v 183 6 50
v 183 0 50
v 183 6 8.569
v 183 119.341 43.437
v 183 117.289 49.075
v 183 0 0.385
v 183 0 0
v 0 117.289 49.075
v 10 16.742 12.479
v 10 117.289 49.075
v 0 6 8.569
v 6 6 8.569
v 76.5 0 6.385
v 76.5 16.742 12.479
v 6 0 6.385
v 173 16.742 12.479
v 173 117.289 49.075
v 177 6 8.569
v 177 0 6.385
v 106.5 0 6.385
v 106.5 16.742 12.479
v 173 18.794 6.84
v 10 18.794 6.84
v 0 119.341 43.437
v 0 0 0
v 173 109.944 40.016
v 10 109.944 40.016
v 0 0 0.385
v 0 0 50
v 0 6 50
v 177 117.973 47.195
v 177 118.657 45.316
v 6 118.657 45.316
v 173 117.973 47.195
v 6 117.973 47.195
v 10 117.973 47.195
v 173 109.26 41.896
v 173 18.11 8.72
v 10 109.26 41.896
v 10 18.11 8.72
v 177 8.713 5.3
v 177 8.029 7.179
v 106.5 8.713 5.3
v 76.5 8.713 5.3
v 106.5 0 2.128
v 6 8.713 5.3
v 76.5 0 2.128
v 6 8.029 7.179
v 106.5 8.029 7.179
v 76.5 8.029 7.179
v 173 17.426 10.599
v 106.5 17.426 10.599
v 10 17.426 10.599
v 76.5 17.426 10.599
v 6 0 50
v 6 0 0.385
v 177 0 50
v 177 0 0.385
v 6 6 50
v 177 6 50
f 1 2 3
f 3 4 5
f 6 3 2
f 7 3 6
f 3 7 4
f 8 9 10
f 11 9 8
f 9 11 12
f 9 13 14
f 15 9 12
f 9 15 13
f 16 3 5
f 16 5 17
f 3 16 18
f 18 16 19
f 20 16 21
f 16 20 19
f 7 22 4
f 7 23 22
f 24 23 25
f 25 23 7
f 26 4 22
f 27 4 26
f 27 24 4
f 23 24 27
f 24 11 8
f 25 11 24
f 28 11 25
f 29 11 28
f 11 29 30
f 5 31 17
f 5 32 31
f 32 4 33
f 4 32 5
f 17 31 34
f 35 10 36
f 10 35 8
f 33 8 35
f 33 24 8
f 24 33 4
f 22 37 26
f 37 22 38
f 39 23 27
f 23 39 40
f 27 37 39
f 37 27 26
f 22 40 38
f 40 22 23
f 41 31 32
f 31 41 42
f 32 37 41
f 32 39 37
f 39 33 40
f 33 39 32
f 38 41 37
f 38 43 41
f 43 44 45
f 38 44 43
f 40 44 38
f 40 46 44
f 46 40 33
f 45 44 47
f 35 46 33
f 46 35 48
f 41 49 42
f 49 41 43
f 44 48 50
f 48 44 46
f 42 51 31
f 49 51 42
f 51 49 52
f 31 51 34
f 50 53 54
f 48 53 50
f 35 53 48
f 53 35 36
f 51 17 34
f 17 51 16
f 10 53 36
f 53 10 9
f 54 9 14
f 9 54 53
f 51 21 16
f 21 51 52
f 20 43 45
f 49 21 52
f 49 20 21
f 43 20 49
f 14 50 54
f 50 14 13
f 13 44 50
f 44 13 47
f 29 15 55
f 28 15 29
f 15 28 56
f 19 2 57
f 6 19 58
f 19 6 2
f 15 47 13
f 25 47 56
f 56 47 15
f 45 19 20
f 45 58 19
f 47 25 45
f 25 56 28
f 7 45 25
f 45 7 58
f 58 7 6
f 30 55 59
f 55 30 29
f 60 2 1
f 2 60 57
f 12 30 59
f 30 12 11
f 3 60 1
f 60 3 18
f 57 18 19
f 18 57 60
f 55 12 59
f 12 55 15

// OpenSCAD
// TODO:
// 1. More space for cable, requires ~4mm below bottom of screen
// 2. Hold the screen in place better
// 3. Mount for raspi
//
// Maybe:
// - Bigger notch, so I don't have to clear out the debris?
// - It's a little transparent when the sun is behind it
// - Is angle best?
// - Maybe the slot should be on the sides instead of the bottom

module example_intersection()
{
  // Options for case
  thickness = 6;
  angle = 20;
  bottom_bezel = 20;
  main_bezel = 10;
  base_depth = 50;
  cable_notch_width = 30;

  // Physical params of display
  screen_width = 163;
  screen_height = 97;
  inset = 4;
  bottom_inset = 10;
  inset_thickness = 2;

  // Computed params
  frame_outside_width = screen_width + 2 * main_bezel;
  frame_outside_height = screen_height + bottom_bezel + main_bezel;

  leftover_inset = main_bezel - inset;
  leftover_bottom_inset = bottom_bezel - bottom_inset;

  // Increasing X: Left to right, looking straight on
  // Increasing Y: Down to up, looking straight on
  // Increazing Z: Front to back, looking straight on

  rotate([0,0,0]) {
    // Main frame
    difference() {
      rotate([angle, 0, 0]) {
        difference() {
          union() {
            difference() {
              // Main housing
              cube([frame_outside_width, frame_outside_height, thickness], center=false);

              // Punch a hole all the way through for visible part of the screen
              translate([main_bezel, bottom_bezel,0]) {
                cube([screen_width, screen_height, thickness], center= false);
              };

              // Slightly larger inset a bit around edges
              // Leaves inset_thickness remaining
              translate([leftover_inset, leftover_bottom_inset, inset_thickness]) {
                cube([screen_width + 2 * inset, frame_outside_height - leftover_bottom_inset, thickness-inset_thickness], center = false);
              };
            };

            translate([0, 0, thickness - inset_thickness]) {
              difference() {
                cube([frame_outside_width, frame_outside_height, inset_thickness], center=false);
                translate([main_bezel,bottom_bezel,0]) {
                  cube([screen_width, screen_height + main_bezel, inset_thickness], center=false);
                };
              };
            };

            // Add a back for the little slot
//            translate([0, leftover_bottom_inset, thickness - inset_thickness]) {
//              cube([frame_outside_width, bottom_inset, inset_thickness], center = false);
//            };

          };

          // Remove a notch for the cable:
          translate([(frame_outside_width - cable_notch_width) / 2, 0, inset_thickness]) {
            cube([cable_notch_width, bottom_bezel, thickness - inset_thickness], center = false);
          };
        };
      };


      // strip the lip off the bottom:
      void_height = 10;
      void_depth = 40;
      translate([0, void_height * -1, void_depth / 2 * -1]) {
        cube([frame_outside_width, void_height, void_depth], center=false);
      }
    }

    // Base
    difference() {
      cube([frame_outside_width, thickness, base_depth]);

      translate([thickness, 0, 0]) {
        cube([frame_outside_width - thickness * 2, thickness, base_depth]);
      }

      // strip the lip off the front:
      translate([0, 0, thickness * -1]) {
        rotate([angle, 0, 0]) {
          cube([frame_outside_width, frame_outside_height, thickness], center=false);
        }
      }
    }
  }
}

example_intersection();
